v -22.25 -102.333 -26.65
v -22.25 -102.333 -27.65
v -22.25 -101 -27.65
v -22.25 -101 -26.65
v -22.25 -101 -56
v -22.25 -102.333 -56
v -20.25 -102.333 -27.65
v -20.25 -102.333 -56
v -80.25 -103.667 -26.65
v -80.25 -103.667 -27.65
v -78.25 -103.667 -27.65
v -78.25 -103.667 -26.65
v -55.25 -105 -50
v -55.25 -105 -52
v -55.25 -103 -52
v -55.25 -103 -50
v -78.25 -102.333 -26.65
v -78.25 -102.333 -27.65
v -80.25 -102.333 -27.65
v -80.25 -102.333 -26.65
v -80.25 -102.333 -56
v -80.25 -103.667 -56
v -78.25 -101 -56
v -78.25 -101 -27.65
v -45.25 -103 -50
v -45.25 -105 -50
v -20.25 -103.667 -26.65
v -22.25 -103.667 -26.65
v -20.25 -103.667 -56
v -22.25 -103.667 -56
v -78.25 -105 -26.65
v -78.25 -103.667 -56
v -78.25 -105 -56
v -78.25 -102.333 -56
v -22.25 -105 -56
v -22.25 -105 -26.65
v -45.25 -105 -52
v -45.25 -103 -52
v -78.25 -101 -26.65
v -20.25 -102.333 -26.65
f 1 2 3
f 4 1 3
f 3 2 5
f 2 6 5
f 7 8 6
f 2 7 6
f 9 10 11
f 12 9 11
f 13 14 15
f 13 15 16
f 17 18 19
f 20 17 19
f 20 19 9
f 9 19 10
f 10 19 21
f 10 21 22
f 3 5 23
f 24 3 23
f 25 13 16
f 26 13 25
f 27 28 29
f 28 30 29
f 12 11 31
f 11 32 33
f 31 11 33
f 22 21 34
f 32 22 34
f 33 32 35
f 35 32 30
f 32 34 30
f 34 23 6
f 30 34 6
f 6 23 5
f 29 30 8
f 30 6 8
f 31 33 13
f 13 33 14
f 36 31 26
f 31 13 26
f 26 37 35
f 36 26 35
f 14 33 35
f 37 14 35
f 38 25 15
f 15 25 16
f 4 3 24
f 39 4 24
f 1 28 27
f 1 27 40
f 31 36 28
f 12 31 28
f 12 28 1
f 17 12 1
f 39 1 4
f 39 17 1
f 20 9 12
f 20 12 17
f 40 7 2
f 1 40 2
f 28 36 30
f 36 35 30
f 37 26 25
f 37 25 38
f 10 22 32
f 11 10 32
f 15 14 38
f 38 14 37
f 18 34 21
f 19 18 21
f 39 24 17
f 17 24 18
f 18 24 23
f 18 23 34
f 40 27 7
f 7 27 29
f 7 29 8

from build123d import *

# Parameters (mm, degrees)
PAD015_DEPTH    = 28.35
POCKET020_DEPTH = 2
PAD045_DEPTH    = 1


with BuildPart() as part:
    # Sketch029 → Pad015 (new body)
    with BuildSketch(Plane.XY):
        Polygon((-78.25, -81.000001), (-78.25, -82.333334), (-80.25, -82.333334), (-80.25, -83.666667), (-78.25, -83.666667), (-78.25, -85), (-22.25, -85), (-22.25, -83.666667), (-20.25, -83.666667), (-20.25, -82.333334), (-22.25, -82.333334), (-22.25, -81.000001), align=None)
    extrude(amount=PAD015_DEPTH)

    # Sketch037 (on Face6 of Pad015) → Pocket020 (cut)
    with BuildSketch(Plane.XZ.offset(85)):
        Polygon((-55.25, 6), (-45.25, 6), (-45.25, 4), (-50.25, 4), (-55.25, 4), align=None)
    extrude(amount=-POCKET020_DEPTH, mode=Mode.SUBTRACT)

    # Pocket020 Face5 → Pad045 (add)
    with BuildSketch(Plane(origin=(-50.25, -83, 28.35), x_dir=(0, 1, 0), z_dir=(0, 0, 1))):
        Polygon((2, 28), (0.666667, 28), (0.666667, 30), (-0.666666, 30), (-0.666666, 28), (-2, 28), (-2, -28), (-0.666667, -28), (-0.666667, -30), (0.666667, -30), (0.666667, -28), (2, -28), align=None)
    extrude(amount=PAD045_DEPTH)


with BuildPart() as part_1:
    # Body003 placement: moved
    add(part.part.moved(Location((0, -20, -56))))


solid = part_1.part
